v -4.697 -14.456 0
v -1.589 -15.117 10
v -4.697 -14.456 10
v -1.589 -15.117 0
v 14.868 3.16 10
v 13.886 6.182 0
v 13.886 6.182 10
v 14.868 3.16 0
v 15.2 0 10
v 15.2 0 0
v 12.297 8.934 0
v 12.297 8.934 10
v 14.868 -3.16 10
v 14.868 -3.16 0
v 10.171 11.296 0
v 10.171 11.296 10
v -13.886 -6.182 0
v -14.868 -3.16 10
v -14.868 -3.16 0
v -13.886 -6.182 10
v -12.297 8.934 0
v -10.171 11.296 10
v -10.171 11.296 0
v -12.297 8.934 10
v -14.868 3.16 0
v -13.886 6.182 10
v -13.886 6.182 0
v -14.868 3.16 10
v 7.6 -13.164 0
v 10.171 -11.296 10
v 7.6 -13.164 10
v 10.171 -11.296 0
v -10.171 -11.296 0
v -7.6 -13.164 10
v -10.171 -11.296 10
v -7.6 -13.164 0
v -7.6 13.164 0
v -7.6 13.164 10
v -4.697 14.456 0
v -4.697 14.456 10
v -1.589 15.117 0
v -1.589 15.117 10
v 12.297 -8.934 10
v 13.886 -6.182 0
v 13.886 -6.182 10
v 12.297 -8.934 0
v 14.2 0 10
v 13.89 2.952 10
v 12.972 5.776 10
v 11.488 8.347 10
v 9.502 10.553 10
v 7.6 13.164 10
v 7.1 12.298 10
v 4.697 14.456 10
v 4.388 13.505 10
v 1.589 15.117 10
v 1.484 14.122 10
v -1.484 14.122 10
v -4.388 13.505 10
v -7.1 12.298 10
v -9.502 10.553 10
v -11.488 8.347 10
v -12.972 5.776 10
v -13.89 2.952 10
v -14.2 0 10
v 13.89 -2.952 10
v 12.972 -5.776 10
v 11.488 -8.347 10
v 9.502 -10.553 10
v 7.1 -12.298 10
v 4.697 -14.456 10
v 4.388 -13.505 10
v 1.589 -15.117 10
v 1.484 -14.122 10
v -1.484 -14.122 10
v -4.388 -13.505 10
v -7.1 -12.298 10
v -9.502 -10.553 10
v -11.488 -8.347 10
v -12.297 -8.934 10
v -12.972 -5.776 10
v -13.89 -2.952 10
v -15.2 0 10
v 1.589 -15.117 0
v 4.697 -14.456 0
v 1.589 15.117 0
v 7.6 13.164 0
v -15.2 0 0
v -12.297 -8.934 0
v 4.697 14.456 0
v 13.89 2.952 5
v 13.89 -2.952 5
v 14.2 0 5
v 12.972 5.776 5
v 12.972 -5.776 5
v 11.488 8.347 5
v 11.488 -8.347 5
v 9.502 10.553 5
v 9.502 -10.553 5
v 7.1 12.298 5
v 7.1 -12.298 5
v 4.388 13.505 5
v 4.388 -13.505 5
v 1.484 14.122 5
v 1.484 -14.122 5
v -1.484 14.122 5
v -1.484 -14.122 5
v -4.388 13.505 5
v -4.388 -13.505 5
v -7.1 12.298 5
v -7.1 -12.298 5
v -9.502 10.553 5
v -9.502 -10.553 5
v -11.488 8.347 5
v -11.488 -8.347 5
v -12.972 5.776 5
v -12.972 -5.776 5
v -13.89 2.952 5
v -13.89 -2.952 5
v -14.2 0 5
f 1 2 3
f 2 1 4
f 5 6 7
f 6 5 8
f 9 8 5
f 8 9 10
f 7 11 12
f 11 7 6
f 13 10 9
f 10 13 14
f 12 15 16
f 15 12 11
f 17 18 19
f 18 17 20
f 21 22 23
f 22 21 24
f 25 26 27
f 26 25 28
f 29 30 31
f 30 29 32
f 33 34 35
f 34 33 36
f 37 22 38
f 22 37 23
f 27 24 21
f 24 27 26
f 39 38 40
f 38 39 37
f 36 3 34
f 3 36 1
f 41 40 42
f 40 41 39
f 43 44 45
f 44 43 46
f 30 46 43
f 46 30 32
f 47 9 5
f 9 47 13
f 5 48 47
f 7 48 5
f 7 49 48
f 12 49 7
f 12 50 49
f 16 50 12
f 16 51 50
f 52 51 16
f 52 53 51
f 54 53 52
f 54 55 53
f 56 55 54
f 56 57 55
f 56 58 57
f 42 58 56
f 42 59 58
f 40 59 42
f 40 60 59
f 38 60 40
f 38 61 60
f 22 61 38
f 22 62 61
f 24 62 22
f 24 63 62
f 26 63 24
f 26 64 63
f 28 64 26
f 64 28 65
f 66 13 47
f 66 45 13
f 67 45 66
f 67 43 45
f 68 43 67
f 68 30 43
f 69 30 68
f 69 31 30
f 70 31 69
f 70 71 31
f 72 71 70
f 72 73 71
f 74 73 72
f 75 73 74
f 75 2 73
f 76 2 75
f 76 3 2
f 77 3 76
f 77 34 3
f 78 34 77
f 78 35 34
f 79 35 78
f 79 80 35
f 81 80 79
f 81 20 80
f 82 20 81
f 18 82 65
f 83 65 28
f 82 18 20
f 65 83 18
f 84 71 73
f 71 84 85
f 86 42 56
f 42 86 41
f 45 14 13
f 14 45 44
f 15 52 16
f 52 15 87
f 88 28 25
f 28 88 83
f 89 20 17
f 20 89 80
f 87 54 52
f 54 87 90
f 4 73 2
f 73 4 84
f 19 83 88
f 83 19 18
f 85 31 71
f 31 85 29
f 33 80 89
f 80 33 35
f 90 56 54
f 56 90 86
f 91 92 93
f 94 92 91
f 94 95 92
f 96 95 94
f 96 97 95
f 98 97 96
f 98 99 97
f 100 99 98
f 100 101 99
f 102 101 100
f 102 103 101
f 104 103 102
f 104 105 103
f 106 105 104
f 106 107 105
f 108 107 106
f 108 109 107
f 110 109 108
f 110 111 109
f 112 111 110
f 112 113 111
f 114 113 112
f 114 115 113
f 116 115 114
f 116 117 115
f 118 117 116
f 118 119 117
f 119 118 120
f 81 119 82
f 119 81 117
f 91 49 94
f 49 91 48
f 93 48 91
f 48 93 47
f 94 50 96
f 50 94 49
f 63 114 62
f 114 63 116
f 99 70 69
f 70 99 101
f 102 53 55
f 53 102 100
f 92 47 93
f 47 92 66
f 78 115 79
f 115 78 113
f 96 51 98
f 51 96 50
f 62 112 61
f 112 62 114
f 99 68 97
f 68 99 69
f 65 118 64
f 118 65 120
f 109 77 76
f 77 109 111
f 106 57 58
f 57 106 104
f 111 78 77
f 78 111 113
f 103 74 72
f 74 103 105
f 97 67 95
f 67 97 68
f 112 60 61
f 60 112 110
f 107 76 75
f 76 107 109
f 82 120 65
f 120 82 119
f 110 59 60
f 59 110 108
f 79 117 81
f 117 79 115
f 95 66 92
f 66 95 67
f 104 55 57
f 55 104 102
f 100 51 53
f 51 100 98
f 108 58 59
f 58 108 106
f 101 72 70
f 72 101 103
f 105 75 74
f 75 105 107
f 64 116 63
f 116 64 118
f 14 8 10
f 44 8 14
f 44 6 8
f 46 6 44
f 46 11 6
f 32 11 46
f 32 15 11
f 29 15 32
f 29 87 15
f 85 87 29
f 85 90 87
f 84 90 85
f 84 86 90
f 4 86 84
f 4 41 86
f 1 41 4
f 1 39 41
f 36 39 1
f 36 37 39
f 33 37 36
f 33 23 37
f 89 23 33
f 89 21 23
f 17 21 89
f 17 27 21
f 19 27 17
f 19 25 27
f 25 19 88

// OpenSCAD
module spring_holder(dia, height){
    cylinder(h = height, r = dia/2 + 1, center = false);
    translate([0, 0, height])
    difference(){
        cylinder(h = height, r = dia/2 + 1, center = false);
        translate([0, 0, 1]);
        cylinder(h = height + 2, r = dia/2, center = false);
    }
}

 spring_holder(28.4, 5);
